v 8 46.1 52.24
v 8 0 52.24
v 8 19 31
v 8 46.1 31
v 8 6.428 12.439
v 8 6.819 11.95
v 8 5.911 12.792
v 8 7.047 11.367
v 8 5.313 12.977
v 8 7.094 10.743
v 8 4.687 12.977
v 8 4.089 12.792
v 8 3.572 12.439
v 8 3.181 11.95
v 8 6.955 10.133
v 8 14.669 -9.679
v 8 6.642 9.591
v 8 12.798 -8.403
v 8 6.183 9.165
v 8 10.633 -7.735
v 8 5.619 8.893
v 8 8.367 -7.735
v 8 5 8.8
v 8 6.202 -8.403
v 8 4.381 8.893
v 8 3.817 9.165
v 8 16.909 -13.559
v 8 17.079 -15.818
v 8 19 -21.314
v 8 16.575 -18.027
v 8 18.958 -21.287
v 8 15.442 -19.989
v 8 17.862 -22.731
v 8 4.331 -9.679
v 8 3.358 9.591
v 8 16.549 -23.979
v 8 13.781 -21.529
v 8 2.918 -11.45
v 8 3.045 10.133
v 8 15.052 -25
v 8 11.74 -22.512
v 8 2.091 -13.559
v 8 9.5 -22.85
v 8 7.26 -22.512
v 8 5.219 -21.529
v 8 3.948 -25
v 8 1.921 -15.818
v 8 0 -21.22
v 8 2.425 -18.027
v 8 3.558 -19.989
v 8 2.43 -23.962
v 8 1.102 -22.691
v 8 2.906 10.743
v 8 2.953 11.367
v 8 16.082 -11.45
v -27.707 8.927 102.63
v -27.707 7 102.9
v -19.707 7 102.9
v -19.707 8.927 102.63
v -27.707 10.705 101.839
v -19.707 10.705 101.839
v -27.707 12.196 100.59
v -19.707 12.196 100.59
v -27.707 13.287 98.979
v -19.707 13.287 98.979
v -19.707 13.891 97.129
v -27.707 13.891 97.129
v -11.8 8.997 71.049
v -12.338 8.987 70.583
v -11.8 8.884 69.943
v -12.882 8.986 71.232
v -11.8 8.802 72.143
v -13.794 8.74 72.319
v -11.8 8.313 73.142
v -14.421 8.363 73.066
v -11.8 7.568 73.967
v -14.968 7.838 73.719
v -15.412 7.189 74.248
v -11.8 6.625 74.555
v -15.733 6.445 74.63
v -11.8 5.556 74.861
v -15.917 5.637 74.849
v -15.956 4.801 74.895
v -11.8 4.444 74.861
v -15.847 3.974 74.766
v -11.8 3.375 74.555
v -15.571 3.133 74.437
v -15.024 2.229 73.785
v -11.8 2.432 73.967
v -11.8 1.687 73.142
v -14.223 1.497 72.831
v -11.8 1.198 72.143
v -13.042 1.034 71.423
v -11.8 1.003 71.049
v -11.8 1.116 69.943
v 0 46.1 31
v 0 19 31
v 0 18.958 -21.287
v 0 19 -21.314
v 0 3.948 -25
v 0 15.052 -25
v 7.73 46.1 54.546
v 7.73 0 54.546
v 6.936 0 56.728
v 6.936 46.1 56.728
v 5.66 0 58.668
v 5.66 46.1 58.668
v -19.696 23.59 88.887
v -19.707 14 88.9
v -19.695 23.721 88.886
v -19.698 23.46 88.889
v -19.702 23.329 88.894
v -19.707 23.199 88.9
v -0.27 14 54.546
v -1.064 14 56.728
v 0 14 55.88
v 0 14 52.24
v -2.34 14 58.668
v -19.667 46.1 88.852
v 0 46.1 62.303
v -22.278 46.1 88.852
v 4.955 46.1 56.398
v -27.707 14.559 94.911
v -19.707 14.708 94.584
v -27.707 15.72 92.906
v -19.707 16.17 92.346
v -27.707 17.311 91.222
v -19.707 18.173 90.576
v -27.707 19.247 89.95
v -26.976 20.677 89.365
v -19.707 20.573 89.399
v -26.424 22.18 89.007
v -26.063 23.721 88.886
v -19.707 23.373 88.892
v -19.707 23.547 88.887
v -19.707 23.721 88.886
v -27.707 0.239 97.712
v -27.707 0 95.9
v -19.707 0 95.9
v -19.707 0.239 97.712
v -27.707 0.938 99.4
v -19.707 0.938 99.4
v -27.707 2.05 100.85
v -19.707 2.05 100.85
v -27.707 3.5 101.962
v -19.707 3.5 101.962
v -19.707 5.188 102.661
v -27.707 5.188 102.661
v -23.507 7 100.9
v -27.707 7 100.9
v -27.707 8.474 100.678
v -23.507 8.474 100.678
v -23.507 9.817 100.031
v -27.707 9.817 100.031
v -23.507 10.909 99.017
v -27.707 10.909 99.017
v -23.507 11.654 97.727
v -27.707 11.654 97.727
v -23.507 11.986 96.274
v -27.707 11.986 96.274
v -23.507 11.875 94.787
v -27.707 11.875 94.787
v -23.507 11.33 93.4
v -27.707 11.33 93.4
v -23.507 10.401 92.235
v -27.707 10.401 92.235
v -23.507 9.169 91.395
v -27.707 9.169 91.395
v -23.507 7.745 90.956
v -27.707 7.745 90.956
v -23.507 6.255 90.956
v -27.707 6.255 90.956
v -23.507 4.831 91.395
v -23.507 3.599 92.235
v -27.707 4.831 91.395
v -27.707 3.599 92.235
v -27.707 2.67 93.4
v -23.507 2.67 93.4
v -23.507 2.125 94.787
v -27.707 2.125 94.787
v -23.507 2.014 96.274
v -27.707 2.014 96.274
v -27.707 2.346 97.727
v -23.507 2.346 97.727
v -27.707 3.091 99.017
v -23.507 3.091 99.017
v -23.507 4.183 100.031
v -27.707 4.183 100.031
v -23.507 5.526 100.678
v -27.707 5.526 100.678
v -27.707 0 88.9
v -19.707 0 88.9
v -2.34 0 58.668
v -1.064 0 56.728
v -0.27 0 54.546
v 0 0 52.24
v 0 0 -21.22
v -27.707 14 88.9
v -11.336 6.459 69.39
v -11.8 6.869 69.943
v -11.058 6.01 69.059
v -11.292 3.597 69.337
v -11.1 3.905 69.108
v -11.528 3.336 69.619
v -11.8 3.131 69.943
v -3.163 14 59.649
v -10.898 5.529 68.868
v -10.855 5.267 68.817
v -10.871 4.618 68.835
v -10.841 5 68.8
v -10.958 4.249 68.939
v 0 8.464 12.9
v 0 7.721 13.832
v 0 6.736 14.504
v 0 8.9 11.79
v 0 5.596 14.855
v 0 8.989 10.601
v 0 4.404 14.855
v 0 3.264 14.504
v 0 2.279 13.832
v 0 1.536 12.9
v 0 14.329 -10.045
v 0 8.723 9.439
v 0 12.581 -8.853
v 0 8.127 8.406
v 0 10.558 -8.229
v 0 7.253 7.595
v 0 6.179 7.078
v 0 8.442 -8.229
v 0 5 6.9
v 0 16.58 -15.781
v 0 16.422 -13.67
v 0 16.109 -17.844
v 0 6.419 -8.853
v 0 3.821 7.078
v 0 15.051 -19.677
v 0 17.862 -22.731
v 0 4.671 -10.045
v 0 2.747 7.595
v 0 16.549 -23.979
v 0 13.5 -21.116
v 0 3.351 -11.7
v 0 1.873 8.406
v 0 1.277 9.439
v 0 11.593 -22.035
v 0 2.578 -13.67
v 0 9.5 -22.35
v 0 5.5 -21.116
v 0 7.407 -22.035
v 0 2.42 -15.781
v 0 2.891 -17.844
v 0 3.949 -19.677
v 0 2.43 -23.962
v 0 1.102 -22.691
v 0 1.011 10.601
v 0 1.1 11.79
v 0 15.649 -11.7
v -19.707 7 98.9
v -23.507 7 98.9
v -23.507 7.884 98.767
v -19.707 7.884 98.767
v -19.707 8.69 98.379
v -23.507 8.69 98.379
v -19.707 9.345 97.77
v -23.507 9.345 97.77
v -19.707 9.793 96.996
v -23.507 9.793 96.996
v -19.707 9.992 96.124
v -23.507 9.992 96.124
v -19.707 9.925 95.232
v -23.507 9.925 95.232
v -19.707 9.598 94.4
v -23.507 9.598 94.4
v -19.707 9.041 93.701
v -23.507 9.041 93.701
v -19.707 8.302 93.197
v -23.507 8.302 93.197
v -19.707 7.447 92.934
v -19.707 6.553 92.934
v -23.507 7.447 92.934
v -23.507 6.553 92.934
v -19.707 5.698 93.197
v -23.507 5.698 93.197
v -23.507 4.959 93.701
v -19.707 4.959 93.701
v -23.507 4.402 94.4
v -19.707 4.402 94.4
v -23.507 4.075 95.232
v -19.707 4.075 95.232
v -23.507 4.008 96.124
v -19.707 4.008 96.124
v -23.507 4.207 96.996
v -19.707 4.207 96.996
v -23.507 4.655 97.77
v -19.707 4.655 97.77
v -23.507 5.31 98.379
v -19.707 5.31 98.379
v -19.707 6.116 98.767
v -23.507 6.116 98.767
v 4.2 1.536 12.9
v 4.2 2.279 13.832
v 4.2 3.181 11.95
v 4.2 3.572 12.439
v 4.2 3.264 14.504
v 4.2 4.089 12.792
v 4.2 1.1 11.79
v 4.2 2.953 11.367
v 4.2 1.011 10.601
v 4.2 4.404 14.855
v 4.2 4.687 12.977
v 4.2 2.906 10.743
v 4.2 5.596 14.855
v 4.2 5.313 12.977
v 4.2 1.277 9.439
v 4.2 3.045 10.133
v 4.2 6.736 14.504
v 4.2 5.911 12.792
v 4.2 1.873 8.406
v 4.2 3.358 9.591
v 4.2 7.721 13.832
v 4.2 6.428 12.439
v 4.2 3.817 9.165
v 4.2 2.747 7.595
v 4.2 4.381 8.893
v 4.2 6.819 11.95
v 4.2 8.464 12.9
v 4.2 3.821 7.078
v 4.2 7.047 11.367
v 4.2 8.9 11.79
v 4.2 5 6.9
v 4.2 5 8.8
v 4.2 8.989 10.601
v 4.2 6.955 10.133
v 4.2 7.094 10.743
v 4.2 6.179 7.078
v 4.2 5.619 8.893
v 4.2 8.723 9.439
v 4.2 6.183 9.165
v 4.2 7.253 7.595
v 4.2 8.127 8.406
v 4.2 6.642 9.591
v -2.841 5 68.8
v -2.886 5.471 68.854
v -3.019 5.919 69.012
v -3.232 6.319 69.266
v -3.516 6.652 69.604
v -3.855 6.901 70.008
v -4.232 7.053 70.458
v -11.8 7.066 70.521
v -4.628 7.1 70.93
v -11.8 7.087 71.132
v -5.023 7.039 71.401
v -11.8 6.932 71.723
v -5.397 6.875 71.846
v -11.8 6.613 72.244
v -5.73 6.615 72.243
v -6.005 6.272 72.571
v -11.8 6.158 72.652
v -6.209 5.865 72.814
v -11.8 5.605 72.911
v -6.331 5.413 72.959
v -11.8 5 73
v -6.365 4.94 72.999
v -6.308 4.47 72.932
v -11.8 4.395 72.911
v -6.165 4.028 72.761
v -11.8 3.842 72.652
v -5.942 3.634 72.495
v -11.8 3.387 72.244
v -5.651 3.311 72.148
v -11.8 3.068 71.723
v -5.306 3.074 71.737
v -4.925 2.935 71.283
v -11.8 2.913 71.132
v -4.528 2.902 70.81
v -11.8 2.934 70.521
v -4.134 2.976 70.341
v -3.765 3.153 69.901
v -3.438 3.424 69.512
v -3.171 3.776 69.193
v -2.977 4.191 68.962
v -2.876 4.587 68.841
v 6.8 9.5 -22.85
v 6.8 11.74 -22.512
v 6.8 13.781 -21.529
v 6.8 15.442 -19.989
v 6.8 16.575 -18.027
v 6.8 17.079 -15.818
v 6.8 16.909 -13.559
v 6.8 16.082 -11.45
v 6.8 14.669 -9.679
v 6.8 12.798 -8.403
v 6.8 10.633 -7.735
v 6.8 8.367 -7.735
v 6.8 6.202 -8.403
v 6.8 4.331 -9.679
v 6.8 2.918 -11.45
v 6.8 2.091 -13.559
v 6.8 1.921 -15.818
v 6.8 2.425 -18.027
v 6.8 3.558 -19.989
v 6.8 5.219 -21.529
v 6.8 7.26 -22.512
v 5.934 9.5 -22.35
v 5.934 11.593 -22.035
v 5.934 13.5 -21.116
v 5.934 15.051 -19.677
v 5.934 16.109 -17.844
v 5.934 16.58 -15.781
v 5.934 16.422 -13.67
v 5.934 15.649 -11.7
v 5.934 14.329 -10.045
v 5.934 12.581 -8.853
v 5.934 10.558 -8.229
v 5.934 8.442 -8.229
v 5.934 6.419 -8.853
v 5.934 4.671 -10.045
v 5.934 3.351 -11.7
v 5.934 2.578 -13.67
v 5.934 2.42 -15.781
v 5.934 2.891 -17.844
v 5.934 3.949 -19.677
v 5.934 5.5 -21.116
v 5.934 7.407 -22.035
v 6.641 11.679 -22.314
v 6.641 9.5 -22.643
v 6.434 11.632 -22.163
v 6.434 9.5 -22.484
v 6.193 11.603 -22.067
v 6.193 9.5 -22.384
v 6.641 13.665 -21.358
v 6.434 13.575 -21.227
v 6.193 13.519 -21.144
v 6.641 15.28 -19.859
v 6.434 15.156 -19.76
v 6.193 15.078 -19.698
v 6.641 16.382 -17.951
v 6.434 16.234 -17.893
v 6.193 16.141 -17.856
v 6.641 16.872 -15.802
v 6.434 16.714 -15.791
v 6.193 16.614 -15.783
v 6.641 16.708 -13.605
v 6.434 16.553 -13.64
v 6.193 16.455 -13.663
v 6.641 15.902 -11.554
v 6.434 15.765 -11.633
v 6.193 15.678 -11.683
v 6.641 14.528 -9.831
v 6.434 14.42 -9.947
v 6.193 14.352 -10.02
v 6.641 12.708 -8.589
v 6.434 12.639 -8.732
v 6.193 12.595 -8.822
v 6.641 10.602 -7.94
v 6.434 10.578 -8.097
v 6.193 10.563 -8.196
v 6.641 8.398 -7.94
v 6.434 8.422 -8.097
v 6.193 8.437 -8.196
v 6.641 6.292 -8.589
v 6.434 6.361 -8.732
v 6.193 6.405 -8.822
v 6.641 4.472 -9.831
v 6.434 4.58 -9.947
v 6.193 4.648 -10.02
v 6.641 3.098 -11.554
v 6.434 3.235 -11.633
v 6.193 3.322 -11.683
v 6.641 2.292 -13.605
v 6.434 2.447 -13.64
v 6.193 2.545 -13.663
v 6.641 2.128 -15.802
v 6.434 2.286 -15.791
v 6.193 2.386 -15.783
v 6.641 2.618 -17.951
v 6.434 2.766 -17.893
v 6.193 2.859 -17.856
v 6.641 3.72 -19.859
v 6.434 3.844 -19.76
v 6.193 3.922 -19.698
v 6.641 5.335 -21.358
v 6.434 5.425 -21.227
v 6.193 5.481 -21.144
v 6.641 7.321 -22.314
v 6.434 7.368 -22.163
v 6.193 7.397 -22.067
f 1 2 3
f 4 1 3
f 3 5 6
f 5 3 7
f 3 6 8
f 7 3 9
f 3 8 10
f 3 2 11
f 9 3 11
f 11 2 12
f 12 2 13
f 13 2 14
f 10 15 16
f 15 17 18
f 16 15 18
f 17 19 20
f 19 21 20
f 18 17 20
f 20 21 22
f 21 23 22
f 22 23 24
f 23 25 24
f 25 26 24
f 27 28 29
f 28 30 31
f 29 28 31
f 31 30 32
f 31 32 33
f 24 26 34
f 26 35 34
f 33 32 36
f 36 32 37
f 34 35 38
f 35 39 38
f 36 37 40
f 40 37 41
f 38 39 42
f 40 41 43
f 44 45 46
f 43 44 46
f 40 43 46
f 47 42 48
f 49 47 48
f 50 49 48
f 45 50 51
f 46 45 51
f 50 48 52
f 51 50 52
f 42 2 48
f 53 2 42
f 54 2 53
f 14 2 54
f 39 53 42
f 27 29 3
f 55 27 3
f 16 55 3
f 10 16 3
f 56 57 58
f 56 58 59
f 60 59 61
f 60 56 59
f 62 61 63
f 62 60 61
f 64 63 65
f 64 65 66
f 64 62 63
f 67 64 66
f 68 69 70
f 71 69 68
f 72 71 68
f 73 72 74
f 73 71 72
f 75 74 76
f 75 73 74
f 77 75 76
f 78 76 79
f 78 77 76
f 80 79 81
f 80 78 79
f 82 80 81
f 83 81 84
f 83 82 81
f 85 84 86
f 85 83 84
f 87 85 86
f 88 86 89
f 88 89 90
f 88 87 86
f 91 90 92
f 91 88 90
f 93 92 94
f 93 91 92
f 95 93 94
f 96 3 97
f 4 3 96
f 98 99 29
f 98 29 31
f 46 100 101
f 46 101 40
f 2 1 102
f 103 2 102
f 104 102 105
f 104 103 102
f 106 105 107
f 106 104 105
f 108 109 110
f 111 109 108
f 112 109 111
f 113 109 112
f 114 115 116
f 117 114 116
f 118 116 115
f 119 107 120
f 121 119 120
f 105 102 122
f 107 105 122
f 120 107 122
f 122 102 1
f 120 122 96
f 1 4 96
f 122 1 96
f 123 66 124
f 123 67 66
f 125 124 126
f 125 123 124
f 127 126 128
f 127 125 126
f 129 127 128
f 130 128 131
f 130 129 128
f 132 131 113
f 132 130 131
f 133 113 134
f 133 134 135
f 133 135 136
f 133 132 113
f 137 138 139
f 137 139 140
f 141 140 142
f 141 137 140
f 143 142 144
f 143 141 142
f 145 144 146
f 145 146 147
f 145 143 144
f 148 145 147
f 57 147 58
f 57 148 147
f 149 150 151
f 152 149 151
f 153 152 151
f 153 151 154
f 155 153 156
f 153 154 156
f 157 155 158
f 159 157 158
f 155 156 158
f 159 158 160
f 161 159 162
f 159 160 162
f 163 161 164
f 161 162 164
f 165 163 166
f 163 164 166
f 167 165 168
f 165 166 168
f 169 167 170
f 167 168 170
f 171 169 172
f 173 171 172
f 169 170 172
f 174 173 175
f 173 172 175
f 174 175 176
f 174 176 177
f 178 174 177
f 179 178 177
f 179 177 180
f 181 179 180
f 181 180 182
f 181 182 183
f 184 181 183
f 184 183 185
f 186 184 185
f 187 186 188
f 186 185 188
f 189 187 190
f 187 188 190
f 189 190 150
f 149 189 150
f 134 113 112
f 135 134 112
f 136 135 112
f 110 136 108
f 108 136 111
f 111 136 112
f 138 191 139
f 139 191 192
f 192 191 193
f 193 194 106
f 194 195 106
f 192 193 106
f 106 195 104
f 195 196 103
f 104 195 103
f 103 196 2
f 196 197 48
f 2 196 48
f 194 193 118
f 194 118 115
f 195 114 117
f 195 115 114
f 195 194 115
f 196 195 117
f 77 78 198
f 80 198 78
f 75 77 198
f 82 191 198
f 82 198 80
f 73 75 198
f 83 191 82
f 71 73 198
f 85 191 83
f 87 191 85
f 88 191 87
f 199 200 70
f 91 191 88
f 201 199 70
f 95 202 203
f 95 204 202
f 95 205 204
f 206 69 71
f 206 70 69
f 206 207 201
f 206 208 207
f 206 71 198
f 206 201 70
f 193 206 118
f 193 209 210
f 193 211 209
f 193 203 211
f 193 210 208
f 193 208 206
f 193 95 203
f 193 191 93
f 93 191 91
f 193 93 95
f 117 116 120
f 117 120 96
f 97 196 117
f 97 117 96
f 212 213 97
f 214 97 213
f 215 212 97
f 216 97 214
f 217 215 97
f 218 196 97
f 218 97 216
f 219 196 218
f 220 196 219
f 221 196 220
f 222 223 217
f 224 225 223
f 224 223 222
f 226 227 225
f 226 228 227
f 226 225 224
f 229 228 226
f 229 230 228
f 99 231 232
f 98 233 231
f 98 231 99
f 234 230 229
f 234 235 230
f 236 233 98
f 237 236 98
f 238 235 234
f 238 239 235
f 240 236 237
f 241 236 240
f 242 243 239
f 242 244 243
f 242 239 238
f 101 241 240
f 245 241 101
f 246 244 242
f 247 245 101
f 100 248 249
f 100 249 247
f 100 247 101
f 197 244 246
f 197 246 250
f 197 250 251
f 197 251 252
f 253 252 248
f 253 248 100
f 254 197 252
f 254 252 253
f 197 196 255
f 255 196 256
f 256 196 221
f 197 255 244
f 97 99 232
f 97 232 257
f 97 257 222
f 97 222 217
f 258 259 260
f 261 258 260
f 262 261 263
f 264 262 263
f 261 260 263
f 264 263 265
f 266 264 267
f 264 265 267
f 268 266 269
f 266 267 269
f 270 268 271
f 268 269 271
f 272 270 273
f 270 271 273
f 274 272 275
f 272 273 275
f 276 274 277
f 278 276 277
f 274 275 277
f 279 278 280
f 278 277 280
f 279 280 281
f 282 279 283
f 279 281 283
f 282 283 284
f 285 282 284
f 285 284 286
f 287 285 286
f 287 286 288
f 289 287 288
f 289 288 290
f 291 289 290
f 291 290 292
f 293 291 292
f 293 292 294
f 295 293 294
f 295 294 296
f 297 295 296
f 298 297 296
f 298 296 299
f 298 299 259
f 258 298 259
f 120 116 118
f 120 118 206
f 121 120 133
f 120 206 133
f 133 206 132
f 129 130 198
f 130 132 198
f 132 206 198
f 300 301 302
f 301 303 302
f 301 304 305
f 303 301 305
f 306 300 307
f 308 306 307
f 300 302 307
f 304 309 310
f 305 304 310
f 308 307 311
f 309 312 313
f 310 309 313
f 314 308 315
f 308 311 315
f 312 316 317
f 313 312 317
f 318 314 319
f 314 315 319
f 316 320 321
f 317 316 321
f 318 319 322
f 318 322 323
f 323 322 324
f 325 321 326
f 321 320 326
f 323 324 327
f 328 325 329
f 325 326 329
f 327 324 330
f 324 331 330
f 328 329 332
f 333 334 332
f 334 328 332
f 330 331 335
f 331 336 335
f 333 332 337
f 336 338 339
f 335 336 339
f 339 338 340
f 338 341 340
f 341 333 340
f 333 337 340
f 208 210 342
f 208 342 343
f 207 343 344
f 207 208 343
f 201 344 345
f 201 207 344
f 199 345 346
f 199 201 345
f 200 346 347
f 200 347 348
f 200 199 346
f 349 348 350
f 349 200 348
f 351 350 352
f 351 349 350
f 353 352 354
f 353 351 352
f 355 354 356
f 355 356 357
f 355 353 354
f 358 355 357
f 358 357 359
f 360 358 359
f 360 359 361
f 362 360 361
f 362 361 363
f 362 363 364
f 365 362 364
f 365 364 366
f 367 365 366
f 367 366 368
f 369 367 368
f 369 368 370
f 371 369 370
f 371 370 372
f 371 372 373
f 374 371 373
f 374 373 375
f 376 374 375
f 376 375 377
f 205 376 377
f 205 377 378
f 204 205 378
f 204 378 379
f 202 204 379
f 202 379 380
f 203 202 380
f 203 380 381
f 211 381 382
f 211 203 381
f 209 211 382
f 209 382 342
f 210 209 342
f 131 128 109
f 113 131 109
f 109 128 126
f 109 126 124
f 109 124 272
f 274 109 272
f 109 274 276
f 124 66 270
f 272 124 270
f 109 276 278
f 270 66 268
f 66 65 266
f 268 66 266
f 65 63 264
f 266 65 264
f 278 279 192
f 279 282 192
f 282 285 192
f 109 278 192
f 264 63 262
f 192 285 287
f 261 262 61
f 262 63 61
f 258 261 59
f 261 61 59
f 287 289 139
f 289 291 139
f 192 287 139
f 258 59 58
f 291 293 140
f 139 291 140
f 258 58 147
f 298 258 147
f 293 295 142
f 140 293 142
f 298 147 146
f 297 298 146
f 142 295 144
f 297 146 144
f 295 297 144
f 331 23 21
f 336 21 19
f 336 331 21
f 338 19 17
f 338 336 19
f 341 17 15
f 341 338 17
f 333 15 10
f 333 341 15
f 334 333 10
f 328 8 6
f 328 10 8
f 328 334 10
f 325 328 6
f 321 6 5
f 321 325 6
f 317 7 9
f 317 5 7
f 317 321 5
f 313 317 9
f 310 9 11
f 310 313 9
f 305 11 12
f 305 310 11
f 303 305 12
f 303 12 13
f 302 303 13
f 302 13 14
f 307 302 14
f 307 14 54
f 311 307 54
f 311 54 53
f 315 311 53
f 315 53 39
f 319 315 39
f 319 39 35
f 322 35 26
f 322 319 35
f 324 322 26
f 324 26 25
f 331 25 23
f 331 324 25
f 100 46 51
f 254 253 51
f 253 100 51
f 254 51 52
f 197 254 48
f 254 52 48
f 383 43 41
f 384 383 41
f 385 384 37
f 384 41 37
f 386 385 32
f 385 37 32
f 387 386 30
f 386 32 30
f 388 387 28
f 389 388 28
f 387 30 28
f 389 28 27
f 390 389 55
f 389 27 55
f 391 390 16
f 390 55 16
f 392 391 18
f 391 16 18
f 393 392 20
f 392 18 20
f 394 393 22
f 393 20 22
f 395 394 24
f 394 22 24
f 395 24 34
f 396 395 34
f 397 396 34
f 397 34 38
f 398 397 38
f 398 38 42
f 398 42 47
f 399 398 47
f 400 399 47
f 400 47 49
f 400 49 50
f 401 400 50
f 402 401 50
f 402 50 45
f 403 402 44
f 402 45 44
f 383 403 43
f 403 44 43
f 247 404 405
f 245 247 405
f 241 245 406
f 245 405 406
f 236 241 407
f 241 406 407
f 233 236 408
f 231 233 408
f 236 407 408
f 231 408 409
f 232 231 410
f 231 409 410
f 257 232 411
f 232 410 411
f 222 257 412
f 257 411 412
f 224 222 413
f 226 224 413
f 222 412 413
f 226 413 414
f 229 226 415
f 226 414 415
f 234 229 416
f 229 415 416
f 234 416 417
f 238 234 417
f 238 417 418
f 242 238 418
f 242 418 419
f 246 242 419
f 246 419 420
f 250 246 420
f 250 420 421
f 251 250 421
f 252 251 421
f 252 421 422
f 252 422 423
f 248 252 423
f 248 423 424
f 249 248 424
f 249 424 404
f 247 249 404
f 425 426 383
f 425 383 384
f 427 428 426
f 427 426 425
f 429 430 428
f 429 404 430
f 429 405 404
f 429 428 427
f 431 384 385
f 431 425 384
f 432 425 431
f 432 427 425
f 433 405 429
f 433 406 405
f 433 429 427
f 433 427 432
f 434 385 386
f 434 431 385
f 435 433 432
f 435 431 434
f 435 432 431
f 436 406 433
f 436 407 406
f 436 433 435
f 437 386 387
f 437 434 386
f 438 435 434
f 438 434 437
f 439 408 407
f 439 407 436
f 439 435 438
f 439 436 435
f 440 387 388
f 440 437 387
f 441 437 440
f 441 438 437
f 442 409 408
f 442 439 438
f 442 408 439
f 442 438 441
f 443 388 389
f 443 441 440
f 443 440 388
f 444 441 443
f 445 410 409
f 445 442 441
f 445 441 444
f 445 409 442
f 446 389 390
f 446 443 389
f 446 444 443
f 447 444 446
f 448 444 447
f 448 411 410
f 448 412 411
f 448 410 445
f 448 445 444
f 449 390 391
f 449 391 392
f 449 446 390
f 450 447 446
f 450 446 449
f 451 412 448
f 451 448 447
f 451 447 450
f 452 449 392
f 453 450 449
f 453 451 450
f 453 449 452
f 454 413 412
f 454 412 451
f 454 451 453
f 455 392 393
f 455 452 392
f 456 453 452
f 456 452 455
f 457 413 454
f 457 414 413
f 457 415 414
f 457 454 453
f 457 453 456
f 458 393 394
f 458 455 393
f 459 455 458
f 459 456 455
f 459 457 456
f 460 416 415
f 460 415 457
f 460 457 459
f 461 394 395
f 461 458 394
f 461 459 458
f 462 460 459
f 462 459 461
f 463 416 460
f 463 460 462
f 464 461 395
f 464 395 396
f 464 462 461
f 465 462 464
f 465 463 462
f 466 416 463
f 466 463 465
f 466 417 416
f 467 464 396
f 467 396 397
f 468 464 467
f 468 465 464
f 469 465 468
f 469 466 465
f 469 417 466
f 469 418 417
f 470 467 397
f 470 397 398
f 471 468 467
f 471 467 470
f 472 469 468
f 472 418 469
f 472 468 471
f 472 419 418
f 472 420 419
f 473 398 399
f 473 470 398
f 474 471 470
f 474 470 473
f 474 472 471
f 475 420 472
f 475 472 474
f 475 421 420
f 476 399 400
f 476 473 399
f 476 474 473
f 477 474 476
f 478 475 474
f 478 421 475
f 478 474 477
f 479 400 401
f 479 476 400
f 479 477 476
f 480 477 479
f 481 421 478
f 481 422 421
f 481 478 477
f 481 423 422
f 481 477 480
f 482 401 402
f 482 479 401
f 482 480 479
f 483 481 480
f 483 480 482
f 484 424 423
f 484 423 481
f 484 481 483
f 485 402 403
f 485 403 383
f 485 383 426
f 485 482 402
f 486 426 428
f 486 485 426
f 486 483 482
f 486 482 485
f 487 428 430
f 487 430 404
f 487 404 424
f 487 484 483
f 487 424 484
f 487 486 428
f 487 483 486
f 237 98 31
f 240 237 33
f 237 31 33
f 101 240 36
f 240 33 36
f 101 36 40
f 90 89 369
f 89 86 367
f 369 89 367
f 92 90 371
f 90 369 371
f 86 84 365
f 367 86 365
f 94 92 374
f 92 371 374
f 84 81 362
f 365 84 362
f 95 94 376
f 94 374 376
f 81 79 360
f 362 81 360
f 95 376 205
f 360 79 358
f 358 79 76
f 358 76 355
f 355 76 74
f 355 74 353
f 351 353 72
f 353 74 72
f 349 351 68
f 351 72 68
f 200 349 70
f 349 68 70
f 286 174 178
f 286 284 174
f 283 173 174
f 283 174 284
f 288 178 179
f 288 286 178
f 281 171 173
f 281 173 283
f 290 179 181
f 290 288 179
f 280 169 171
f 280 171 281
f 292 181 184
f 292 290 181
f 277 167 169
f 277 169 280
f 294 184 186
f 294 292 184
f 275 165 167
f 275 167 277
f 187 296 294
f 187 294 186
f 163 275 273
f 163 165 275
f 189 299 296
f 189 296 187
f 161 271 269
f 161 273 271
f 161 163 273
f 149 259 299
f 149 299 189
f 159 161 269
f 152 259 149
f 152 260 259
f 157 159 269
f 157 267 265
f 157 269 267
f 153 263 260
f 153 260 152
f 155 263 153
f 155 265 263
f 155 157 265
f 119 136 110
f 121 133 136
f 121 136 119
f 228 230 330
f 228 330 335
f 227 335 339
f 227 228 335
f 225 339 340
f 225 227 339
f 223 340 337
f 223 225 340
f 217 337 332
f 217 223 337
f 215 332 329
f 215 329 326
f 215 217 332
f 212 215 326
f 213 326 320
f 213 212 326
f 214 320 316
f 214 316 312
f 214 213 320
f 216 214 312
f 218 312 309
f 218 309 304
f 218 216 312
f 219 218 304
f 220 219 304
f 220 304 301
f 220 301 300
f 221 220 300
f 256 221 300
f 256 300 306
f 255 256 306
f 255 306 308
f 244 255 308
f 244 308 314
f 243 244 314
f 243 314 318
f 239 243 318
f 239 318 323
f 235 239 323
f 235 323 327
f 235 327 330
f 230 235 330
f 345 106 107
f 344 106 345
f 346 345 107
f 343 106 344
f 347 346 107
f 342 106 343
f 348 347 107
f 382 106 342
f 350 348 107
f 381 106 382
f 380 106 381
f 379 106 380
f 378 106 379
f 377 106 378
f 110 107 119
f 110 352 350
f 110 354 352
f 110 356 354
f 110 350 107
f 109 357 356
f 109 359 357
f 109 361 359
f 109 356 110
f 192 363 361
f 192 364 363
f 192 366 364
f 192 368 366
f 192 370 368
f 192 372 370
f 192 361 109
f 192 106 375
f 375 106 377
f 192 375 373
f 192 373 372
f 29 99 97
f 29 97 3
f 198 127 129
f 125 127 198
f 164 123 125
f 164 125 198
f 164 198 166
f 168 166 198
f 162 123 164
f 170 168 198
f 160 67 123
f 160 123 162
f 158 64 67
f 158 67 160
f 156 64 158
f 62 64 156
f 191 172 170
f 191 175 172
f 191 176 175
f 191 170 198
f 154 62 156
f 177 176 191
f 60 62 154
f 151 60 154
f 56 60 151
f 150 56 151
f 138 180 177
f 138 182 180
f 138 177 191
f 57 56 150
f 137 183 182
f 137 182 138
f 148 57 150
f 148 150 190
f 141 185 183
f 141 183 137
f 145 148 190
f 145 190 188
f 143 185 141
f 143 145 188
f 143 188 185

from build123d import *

# Parameters (mm, degrees)
BOSS_EXTRUDE1_DEPTH     = 46.1
CUT_EXTRUDE1_START      = -8
CUT_EXTRUDE1_DEPTH      = 35.707069821
SKETCH3_R               = 5
CUT_EXTRUDE2_DEPTH      = 4.2
SKETCH4_R               = 3
CUT_EXTRUDE3_DEPTH      = 118.073974259
CUT_EXTRUDE4_START      = -33.042265264
CUT_EXTRUDE4_DEPTH      = 39.042265264
CUT_EXTRUDE4_START_2    = 14
CUT_EXTRUDE4_2_DEPTH    = 32.1
CUT_EXTRUDE4_START_3    = -47.726546034
CUT_EXTRUDE4_3_DEPTH    = 7.708156307
SKETCH8_W               = 31
SKETCH8_H               = 27.1
CUT_EXTRUDE5_DEPTH      = 119.273474775
SKETCH9_W               = 8
SKETCH9_H               = 25
BOSS_EXTRUDE2_DEPTH     = 19
SKETCH10_R              = 7.1
CUT_EXTRUDE6_DEPTH      = 119.273474775
SKETCH11_R              = 7.6
CUT_EXTRUDE7_DEPTH      = 1.2
CUT_EXTRUDE8_DEPTH      = 119.273474775
CUT_EXTRUDE8_DEPTH_BACK = 119.273474775
SKETCH12_R              = 2.1
CUT_EXTRUDE9_DEPTH      = 4.2
CUT_EXTRUDE9_DEPTH_BACK = 119.273474775
CUT_EXTRUDE9_START      = -8
SKETCH14_R              = 4
SKETCH14_R_2            = 2.1
CUT_EXTRUDE10_START     = -24
SKETCH14_3_R            = 4
CUT_EXTRUDE10_DEPTH     = 4.2
FILLET13_R              = 10
FILLET14_R              = 1


with BuildPart() as part:
    # Sketch1 → Boss-Extrude1 (new body)
    with BuildSketch(Plane(origin=(0, 0, 0), x_dir=(1, 0, 0), z_dir=(0, 1, 0))):
        with BuildLine():
            Line((0, 0), (8, 0))
            Line((8, 0), (8, -52.240297657))
            ThreePointArc((8, -52.240297657), (7.396926208, -55.660499091), (5.660444431, -58.668173754))
            Line((5.660444431, -58.668173754), (-19.707069821, -88.9))
            Line((-19.707069821, -88.9), (-19.707069821, -102.9))
            Line((-19.707069821, -102.9), (-27.707069821, -102.9))
            Line((-27.707069821, -102.9), (-27.707069821, -88.9))
            Line((-27.707069821, -88.9), (-2.339555569, -58.668173754))
            ThreePointArc((-2.339555569, -58.668173754), (-0.603073792, -55.660499091), (0, -52.240297657))
            Line((0, -52.240297657), (0, 0))
        make_face()
    extrude(amount=BOSS_EXTRUDE1_DEPTH)

    # Cut-Extrude1: read off the stored shape, not the designer's step
    # Cut-Extrude1 outline → Cut-Extrude1 (cut)
    with BuildSketch(Plane(origin=(-19.707069821, 0, 0), x_dir=(0, 0, -1), z_dir=(1, 0, 0)).offset(CUT_EXTRUDE1_START)):
        with BuildLine():
            ThreePointArc((-95.9, 0), (-100.849747468, 2.050252532), (-102.9, 7))
            Line((-102.9, 7), (-102.9, 0))
            Line((-102.9, 0), (-95.9, 0))
        make_face()
        with BuildLine():
            ThreePointArc((-102.9, 7), (-100.849747468, 11.949747468), (-95.9, 14))
            Line((-95.9, 14), (-88.9, 14))
            Line((-88.9, 14), (-88.852375001, 46.1))
            Line((-88.852375001, 46.1), (-102.9, 46.1))
            Line((-102.9, 46.1), (-102.9, 7))
        make_face()
    extrude(amount=CUT_EXTRUDE1_DEPTH, mode=Mode.SUBTRACT)

    # Sketch3 → Cut-Extrude2 (cut)
    with BuildSketch(Plane.ZY.offset(27.707069821)):
        with Locations((95.9, 7)):
            Circle(SKETCH3_R)
    extrude(amount=-CUT_EXTRUDE2_DEPTH, mode=Mode.SUBTRACT)

    # Sketch4 → Cut-Extrude3 (cut, through all)
    with BuildSketch(Plane.ZY.offset(23.507069821)):
        with Locations((95.9, 7)):
            Circle(SKETCH4_R)
    extrude(amount=-CUT_EXTRUDE3_DEPTH, mode=Mode.SUBTRACT)

    # Cut-Extrude4: read off the stored shape, not the designer's step
    # Cut-Extrude4 outline → Cut-Extrude4 (cut)
    with BuildSketch(Plane(origin=(-51.917191151, 0, 61.872499072), x_dir=(0.7660444431189772, 0, 0.6427876096865404), z_dir=(-0.6427876096865403, 0, 0.7660444431189771)).offset(CUT_EXTRUDE4_START)):
        Polygon((35.918971629, 46.1), (35.918971629, 14), (40.047327174, 46.1), align=None)
    extrude(amount=CUT_EXTRUDE4_DEPTH, mode=Mode.SUBTRACT)

    # Cut-Extrude4 2 outline → Cut-Extrude4 2 (cut)
    with BuildSketch(Plane(origin=(0, 0, 0), x_dir=(1, 0, 0), z_dir=(0, 1, 0)).offset(CUT_EXTRUDE4_START_2)):
        with BuildLine():
            Line((-3.162503825, -59.648925294), (0, -62.302581087))
            Line((0, -62.302581087), (0, -52.240297657))
            ThreePointArc((0, -52.240297657), (-0.603073792, -55.66049909), (-2.339555569, -58.668173754))
            Line((-2.339555569, -58.668173754), (-3.162503825, -59.648925294))
        make_face()
    extrude(amount=CUT_EXTRUDE4_2_DEPTH, mode=Mode.SUBTRACT)

    # Cut-Extrude4 3 outline → Cut-Extrude4 3 (add)
    with BuildSketch(Plane(origin=(0, 0, 0), x_dir=(0.7660444431189768, 0, 0.6427876096865408), z_dir=(0.6427876096865408, 0, -0.7660444431189768)).offset(CUT_EXTRUDE4_START_3)):
        Polygon((40.047327174, -46.1), (40.047327174, -14), (35.918971629, -14), align=None)
    extrude(amount=CUT_EXTRUDE4_3_DEPTH)

    # Sketch8 → Cut-Extrude5 (cut, through all)
    with BuildSketch(Plane(origin=(8, 0, 0), x_dir=(0, 0, -1), z_dir=(1, 0, 0))):
        with Locations((-15.5, 32.55)):
            Rectangle(SKETCH8_W, SKETCH8_H)
    extrude(amount=-CUT_EXTRUDE5_DEPTH, mode=Mode.SUBTRACT)

    # Sketch9 → Boss-Extrude2 (add)
    with BuildSketch(Plane(origin=(0, 0, 0), x_dir=(1, 0, 0), z_dir=(0, 1, 0))):
        with Locations((4, 12.5)):
            Rectangle(SKETCH9_W, SKETCH9_H)
    extrude(amount=BOSS_EXTRUDE2_DEPTH)

    # Sketch10 → Cut-Extrude6 (cut, through all)
    with BuildSketch(Plane(origin=(8, 0, 0), x_dir=(0, 0, -1), z_dir=(1, 0, 0))):
        with BuildLine():
            ThreePointArc((25, 3.947892292), (23.353975422, 1.740233099), (21.219790616, 0))
            Line((21.219790616, 0), (25, 0))
            Line((25, 0), (25, 3.947892292))
        make_face()
        with BuildLine():
            ThreePointArc((21.286823186, 18.957545444), (23.381362589, 17.231063475), (25, 15.052107708))
            Line((25, 15.052107708), (25, 19))
            Line((25, 19), (21.313922252, 19))
            Line((21.313922252, 19), (21.286823186, 18.957545444))
        make_face()
        with Locations((15.25, 9.5)):
            Circle(SKETCH10_R)
    extrude(amount=-CUT_EXTRUDE6_DEPTH, mode=Mode.SUBTRACT)

    # Sketch11 → Cut-Extrude7 (cut)
    with BuildSketch(Plane(origin=(8, 0, 0), x_dir=(0, 0, -1), z_dir=(1, 0, 0))):
        with Locations((15.25, 9.5)):
            Circle(SKETCH11_R)
    extrude(amount=-CUT_EXTRUDE7_DEPTH, mode=Mode.SUBTRACT)

    # Sketch12 → Cut-Extrude8 (cut, two sides: drawn at the far end of the back side and taken through both)
    with BuildSketch(Plane(origin=(8, 0, 0), x_dir=(0, 0, -1), z_dir=(1, 0, 0)).offset(-CUT_EXTRUDE8_DEPTH_BACK)):
        with Locations((-70.9, 5)):
            Circle(SKETCH12_R)
        with Locations((-10.9, 5)):
            Circle(SKETCH12_R)
    extrude(amount=CUT_EXTRUDE8_DEPTH + CUT_EXTRUDE8_DEPTH_BACK, mode=Mode.SUBTRACT)

    # Sketch14 → Cut-Extrude9 (cut, two sides: drawn at the far end of the back side and taken through both)
    with BuildSketch(Plane(origin=(8, 0, 0), x_dir=(0, 0, -1), z_dir=(1, 0, 0)).offset(CUT_EXTRUDE9_START - CUT_EXTRUDE9_DEPTH_BACK)):
        with Locations((-10.9, 5)):
            Circle(SKETCH14_R)
        with Locations((-10.9, 5)):
            Circle(SKETCH14_R_2, mode=Mode.SUBTRACT)
    extrude(amount=CUT_EXTRUDE9_DEPTH + CUT_EXTRUDE9_DEPTH_BACK, mode=Mode.SUBTRACT)

    # Sketch14<3> → Cut-Extrude10 (cut)
    with BuildSketch(Plane(origin=(8, 0, 0), x_dir=(0, 0, -1), z_dir=(1, 0, 0)).offset(CUT_EXTRUDE10_START)):
        with Locations((-70.9, 5)):
            Circle(SKETCH14_3_R)
    extrude(amount=CUT_EXTRUDE10_DEPTH, mode=Mode.SUBTRACT)

    # Fillet13
    # the kernel refuses this fillet: 10 mm, written as the material it adds along each edge
    with BuildSketch(Plane(origin=(-27.707069821, 14, 88.9), x_dir=(0, 0.9999988994008282, -0.0014836431957626689), z_dir=(1, 0, 0))) as fillet13_piece_1_section:
        with BuildLine():
            CenterArc((9.720956062, 10), FILLET13_R, 190.199837756, 79.800162244)
            Line((-0.121005032, 8.229180466), (-1.105201142, 8.052098513))
            ThreePointArc((-1.105201142, 8.052098513), (-1.010384402, 6.998508652), (-0.999998899, -0.001483643))
            Line((-0.999998899, -0.001483643), (0, -1))
            Line((0, -1), (9.720956062, -1))
            Line((9.720956062, -1), (9.720956062, 0))
        make_face()
    fillet13_piece_1 = extrude(amount=8, mode=Mode.PRIVATE)
    fillet13_piece_1 = split(fillet13_piece_1, bisect_by=Plane(origin=(-27.707069822, 14, 88.9), z_dir=(0.75978665319281, -0.12755860295201663, 0.6375367004675092)), keep=Keep.TOP, mode=Mode.PRIVATE)
    fillet13_piece_1 = split(fillet13_piece_1, bisect_by=Plane(origin=(-27.707069821, 14, 88.9), z_dir=(0.7660444431189771, 0, 0.6427876096865404)), keep=Keep.TOP, mode=Mode.PRIVATE)
    fillet13_piece_1 = split(fillet13_piece_1, bisect_by=Plane(origin=(-23.012477111, 14, 92.839231012), z_dir=(-0.7660444431189769, 0, -0.6427876096865407)), keep=Keep.TOP, mode=Mode.PRIVATE)
    add(fillet13_piece_1)
    with BuildSketch(Plane(origin=(-27.707069821, 14, 88.9), x_dir=(0, 0.9999988994008282, -0.0014836431957626689), z_dir=(1, 0, 0))) as fillet13_piece_2_section:
        with BuildLine():
            CenterArc((9.720956062, 10), FILLET13_R, 190.199837756, 79.800162244)
            Line((-0.121005032, 8.229180466), (-1.105201142, 8.052098513))
            ThreePointArc((-1.105201142, 8.052098513), (-1.010384402, 6.998508652), (-0.999998899, -0.001483643))
            Line((-0.999998899, -0.001483643), (0, -1))
            Line((0, -1), (9.720956062, -1))
            Line((9.720956062, -1), (9.720956062, 0))
        make_face()
    fillet13_piece_2 = extrude(amount=8, mode=Mode.PRIVATE)
    fillet13_piece_2 = split(fillet13_piece_2, bisect_by=Plane(origin=(-23.012477111, 14, 92.839231012), z_dir=(0.7660444431189769, 0, 0.6427876096865407)), keep=Keep.TOP, mode=Mode.PRIVATE)
    add(fillet13_piece_2)
    with BuildSketch(Plane(origin=(-27.707069821, 14, 88.9), x_dir=(0, 0.9999988994008282, -0.0014836431957626689), z_dir=(1, 0, 0))) as fillet13_piece_3_section:
        with BuildLine():
            CenterArc((9.720956062, 10), FILLET13_R, 190.199837756, 79.800162244)
            Line((-0.121005032, 8.229180466), (-1.105201142, 8.052098513))
            ThreePointArc((-1.105201142, 8.052098513), (-1.010384402, 6.998508652), (-0.999998899, -0.001483643))
            Line((-0.999998899, -0.001483643), (0, -1))
            Line((0, -1), (9.720956062, -1))
            Line((9.720956062, -1), (9.720956062, 0))
        make_face()
    fillet13_piece_3 = extrude(amount=32.302390155, mode=Mode.PRIVATE)
    fillet13_piece_3 = split(fillet13_piece_3, bisect_by=Plane(origin=(-19.707069821, 14, 88.9), z_dir=(1, 0, 0)), keep=Keep.TOP, mode=Mode.PRIVATE)
    fillet13_piece_3 = split(fillet13_piece_3, bisect_by=Plane(origin=(-23.012477111, 14, 92.839231012), z_dir=(-0.7660444431189769, 0, -0.6427876096865407)), keep=Keep.TOP, mode=Mode.PRIVATE)
    add(fillet13_piece_3)

    # Fillet14
    # the kernel refuses this fillet: 1 mm, written as the material it takes off along each edge
    with BuildSketch(Plane(origin=(6.8, 9.5, -15.25), x_dir=(0, 0, -1), z_dir=(0, -1, 0))) as fillet14_piece_1:
        with BuildLine():
            CenterArc((8.1, -0.866025404), FILLET14_R, 120, 60)
            Line((7.1, -0.866025404), (7.08, -0.866025404))
            Line((7.08, -0.866025404), (7.08, 0))
            Line((7.08, 0), (7.1, 0.02))
            ThreePointArc((7.1, 0.02), (7.35, 0.02), (7.59, 0.017320508))
            Line((7.59, 0.017320508), (7.6, 0))
        make_face()
    revolve(axis=Axis((6.8, 9.5, -15.25), (1, 0, 0)), mode=Mode.SUBTRACT)


solid = part.part
